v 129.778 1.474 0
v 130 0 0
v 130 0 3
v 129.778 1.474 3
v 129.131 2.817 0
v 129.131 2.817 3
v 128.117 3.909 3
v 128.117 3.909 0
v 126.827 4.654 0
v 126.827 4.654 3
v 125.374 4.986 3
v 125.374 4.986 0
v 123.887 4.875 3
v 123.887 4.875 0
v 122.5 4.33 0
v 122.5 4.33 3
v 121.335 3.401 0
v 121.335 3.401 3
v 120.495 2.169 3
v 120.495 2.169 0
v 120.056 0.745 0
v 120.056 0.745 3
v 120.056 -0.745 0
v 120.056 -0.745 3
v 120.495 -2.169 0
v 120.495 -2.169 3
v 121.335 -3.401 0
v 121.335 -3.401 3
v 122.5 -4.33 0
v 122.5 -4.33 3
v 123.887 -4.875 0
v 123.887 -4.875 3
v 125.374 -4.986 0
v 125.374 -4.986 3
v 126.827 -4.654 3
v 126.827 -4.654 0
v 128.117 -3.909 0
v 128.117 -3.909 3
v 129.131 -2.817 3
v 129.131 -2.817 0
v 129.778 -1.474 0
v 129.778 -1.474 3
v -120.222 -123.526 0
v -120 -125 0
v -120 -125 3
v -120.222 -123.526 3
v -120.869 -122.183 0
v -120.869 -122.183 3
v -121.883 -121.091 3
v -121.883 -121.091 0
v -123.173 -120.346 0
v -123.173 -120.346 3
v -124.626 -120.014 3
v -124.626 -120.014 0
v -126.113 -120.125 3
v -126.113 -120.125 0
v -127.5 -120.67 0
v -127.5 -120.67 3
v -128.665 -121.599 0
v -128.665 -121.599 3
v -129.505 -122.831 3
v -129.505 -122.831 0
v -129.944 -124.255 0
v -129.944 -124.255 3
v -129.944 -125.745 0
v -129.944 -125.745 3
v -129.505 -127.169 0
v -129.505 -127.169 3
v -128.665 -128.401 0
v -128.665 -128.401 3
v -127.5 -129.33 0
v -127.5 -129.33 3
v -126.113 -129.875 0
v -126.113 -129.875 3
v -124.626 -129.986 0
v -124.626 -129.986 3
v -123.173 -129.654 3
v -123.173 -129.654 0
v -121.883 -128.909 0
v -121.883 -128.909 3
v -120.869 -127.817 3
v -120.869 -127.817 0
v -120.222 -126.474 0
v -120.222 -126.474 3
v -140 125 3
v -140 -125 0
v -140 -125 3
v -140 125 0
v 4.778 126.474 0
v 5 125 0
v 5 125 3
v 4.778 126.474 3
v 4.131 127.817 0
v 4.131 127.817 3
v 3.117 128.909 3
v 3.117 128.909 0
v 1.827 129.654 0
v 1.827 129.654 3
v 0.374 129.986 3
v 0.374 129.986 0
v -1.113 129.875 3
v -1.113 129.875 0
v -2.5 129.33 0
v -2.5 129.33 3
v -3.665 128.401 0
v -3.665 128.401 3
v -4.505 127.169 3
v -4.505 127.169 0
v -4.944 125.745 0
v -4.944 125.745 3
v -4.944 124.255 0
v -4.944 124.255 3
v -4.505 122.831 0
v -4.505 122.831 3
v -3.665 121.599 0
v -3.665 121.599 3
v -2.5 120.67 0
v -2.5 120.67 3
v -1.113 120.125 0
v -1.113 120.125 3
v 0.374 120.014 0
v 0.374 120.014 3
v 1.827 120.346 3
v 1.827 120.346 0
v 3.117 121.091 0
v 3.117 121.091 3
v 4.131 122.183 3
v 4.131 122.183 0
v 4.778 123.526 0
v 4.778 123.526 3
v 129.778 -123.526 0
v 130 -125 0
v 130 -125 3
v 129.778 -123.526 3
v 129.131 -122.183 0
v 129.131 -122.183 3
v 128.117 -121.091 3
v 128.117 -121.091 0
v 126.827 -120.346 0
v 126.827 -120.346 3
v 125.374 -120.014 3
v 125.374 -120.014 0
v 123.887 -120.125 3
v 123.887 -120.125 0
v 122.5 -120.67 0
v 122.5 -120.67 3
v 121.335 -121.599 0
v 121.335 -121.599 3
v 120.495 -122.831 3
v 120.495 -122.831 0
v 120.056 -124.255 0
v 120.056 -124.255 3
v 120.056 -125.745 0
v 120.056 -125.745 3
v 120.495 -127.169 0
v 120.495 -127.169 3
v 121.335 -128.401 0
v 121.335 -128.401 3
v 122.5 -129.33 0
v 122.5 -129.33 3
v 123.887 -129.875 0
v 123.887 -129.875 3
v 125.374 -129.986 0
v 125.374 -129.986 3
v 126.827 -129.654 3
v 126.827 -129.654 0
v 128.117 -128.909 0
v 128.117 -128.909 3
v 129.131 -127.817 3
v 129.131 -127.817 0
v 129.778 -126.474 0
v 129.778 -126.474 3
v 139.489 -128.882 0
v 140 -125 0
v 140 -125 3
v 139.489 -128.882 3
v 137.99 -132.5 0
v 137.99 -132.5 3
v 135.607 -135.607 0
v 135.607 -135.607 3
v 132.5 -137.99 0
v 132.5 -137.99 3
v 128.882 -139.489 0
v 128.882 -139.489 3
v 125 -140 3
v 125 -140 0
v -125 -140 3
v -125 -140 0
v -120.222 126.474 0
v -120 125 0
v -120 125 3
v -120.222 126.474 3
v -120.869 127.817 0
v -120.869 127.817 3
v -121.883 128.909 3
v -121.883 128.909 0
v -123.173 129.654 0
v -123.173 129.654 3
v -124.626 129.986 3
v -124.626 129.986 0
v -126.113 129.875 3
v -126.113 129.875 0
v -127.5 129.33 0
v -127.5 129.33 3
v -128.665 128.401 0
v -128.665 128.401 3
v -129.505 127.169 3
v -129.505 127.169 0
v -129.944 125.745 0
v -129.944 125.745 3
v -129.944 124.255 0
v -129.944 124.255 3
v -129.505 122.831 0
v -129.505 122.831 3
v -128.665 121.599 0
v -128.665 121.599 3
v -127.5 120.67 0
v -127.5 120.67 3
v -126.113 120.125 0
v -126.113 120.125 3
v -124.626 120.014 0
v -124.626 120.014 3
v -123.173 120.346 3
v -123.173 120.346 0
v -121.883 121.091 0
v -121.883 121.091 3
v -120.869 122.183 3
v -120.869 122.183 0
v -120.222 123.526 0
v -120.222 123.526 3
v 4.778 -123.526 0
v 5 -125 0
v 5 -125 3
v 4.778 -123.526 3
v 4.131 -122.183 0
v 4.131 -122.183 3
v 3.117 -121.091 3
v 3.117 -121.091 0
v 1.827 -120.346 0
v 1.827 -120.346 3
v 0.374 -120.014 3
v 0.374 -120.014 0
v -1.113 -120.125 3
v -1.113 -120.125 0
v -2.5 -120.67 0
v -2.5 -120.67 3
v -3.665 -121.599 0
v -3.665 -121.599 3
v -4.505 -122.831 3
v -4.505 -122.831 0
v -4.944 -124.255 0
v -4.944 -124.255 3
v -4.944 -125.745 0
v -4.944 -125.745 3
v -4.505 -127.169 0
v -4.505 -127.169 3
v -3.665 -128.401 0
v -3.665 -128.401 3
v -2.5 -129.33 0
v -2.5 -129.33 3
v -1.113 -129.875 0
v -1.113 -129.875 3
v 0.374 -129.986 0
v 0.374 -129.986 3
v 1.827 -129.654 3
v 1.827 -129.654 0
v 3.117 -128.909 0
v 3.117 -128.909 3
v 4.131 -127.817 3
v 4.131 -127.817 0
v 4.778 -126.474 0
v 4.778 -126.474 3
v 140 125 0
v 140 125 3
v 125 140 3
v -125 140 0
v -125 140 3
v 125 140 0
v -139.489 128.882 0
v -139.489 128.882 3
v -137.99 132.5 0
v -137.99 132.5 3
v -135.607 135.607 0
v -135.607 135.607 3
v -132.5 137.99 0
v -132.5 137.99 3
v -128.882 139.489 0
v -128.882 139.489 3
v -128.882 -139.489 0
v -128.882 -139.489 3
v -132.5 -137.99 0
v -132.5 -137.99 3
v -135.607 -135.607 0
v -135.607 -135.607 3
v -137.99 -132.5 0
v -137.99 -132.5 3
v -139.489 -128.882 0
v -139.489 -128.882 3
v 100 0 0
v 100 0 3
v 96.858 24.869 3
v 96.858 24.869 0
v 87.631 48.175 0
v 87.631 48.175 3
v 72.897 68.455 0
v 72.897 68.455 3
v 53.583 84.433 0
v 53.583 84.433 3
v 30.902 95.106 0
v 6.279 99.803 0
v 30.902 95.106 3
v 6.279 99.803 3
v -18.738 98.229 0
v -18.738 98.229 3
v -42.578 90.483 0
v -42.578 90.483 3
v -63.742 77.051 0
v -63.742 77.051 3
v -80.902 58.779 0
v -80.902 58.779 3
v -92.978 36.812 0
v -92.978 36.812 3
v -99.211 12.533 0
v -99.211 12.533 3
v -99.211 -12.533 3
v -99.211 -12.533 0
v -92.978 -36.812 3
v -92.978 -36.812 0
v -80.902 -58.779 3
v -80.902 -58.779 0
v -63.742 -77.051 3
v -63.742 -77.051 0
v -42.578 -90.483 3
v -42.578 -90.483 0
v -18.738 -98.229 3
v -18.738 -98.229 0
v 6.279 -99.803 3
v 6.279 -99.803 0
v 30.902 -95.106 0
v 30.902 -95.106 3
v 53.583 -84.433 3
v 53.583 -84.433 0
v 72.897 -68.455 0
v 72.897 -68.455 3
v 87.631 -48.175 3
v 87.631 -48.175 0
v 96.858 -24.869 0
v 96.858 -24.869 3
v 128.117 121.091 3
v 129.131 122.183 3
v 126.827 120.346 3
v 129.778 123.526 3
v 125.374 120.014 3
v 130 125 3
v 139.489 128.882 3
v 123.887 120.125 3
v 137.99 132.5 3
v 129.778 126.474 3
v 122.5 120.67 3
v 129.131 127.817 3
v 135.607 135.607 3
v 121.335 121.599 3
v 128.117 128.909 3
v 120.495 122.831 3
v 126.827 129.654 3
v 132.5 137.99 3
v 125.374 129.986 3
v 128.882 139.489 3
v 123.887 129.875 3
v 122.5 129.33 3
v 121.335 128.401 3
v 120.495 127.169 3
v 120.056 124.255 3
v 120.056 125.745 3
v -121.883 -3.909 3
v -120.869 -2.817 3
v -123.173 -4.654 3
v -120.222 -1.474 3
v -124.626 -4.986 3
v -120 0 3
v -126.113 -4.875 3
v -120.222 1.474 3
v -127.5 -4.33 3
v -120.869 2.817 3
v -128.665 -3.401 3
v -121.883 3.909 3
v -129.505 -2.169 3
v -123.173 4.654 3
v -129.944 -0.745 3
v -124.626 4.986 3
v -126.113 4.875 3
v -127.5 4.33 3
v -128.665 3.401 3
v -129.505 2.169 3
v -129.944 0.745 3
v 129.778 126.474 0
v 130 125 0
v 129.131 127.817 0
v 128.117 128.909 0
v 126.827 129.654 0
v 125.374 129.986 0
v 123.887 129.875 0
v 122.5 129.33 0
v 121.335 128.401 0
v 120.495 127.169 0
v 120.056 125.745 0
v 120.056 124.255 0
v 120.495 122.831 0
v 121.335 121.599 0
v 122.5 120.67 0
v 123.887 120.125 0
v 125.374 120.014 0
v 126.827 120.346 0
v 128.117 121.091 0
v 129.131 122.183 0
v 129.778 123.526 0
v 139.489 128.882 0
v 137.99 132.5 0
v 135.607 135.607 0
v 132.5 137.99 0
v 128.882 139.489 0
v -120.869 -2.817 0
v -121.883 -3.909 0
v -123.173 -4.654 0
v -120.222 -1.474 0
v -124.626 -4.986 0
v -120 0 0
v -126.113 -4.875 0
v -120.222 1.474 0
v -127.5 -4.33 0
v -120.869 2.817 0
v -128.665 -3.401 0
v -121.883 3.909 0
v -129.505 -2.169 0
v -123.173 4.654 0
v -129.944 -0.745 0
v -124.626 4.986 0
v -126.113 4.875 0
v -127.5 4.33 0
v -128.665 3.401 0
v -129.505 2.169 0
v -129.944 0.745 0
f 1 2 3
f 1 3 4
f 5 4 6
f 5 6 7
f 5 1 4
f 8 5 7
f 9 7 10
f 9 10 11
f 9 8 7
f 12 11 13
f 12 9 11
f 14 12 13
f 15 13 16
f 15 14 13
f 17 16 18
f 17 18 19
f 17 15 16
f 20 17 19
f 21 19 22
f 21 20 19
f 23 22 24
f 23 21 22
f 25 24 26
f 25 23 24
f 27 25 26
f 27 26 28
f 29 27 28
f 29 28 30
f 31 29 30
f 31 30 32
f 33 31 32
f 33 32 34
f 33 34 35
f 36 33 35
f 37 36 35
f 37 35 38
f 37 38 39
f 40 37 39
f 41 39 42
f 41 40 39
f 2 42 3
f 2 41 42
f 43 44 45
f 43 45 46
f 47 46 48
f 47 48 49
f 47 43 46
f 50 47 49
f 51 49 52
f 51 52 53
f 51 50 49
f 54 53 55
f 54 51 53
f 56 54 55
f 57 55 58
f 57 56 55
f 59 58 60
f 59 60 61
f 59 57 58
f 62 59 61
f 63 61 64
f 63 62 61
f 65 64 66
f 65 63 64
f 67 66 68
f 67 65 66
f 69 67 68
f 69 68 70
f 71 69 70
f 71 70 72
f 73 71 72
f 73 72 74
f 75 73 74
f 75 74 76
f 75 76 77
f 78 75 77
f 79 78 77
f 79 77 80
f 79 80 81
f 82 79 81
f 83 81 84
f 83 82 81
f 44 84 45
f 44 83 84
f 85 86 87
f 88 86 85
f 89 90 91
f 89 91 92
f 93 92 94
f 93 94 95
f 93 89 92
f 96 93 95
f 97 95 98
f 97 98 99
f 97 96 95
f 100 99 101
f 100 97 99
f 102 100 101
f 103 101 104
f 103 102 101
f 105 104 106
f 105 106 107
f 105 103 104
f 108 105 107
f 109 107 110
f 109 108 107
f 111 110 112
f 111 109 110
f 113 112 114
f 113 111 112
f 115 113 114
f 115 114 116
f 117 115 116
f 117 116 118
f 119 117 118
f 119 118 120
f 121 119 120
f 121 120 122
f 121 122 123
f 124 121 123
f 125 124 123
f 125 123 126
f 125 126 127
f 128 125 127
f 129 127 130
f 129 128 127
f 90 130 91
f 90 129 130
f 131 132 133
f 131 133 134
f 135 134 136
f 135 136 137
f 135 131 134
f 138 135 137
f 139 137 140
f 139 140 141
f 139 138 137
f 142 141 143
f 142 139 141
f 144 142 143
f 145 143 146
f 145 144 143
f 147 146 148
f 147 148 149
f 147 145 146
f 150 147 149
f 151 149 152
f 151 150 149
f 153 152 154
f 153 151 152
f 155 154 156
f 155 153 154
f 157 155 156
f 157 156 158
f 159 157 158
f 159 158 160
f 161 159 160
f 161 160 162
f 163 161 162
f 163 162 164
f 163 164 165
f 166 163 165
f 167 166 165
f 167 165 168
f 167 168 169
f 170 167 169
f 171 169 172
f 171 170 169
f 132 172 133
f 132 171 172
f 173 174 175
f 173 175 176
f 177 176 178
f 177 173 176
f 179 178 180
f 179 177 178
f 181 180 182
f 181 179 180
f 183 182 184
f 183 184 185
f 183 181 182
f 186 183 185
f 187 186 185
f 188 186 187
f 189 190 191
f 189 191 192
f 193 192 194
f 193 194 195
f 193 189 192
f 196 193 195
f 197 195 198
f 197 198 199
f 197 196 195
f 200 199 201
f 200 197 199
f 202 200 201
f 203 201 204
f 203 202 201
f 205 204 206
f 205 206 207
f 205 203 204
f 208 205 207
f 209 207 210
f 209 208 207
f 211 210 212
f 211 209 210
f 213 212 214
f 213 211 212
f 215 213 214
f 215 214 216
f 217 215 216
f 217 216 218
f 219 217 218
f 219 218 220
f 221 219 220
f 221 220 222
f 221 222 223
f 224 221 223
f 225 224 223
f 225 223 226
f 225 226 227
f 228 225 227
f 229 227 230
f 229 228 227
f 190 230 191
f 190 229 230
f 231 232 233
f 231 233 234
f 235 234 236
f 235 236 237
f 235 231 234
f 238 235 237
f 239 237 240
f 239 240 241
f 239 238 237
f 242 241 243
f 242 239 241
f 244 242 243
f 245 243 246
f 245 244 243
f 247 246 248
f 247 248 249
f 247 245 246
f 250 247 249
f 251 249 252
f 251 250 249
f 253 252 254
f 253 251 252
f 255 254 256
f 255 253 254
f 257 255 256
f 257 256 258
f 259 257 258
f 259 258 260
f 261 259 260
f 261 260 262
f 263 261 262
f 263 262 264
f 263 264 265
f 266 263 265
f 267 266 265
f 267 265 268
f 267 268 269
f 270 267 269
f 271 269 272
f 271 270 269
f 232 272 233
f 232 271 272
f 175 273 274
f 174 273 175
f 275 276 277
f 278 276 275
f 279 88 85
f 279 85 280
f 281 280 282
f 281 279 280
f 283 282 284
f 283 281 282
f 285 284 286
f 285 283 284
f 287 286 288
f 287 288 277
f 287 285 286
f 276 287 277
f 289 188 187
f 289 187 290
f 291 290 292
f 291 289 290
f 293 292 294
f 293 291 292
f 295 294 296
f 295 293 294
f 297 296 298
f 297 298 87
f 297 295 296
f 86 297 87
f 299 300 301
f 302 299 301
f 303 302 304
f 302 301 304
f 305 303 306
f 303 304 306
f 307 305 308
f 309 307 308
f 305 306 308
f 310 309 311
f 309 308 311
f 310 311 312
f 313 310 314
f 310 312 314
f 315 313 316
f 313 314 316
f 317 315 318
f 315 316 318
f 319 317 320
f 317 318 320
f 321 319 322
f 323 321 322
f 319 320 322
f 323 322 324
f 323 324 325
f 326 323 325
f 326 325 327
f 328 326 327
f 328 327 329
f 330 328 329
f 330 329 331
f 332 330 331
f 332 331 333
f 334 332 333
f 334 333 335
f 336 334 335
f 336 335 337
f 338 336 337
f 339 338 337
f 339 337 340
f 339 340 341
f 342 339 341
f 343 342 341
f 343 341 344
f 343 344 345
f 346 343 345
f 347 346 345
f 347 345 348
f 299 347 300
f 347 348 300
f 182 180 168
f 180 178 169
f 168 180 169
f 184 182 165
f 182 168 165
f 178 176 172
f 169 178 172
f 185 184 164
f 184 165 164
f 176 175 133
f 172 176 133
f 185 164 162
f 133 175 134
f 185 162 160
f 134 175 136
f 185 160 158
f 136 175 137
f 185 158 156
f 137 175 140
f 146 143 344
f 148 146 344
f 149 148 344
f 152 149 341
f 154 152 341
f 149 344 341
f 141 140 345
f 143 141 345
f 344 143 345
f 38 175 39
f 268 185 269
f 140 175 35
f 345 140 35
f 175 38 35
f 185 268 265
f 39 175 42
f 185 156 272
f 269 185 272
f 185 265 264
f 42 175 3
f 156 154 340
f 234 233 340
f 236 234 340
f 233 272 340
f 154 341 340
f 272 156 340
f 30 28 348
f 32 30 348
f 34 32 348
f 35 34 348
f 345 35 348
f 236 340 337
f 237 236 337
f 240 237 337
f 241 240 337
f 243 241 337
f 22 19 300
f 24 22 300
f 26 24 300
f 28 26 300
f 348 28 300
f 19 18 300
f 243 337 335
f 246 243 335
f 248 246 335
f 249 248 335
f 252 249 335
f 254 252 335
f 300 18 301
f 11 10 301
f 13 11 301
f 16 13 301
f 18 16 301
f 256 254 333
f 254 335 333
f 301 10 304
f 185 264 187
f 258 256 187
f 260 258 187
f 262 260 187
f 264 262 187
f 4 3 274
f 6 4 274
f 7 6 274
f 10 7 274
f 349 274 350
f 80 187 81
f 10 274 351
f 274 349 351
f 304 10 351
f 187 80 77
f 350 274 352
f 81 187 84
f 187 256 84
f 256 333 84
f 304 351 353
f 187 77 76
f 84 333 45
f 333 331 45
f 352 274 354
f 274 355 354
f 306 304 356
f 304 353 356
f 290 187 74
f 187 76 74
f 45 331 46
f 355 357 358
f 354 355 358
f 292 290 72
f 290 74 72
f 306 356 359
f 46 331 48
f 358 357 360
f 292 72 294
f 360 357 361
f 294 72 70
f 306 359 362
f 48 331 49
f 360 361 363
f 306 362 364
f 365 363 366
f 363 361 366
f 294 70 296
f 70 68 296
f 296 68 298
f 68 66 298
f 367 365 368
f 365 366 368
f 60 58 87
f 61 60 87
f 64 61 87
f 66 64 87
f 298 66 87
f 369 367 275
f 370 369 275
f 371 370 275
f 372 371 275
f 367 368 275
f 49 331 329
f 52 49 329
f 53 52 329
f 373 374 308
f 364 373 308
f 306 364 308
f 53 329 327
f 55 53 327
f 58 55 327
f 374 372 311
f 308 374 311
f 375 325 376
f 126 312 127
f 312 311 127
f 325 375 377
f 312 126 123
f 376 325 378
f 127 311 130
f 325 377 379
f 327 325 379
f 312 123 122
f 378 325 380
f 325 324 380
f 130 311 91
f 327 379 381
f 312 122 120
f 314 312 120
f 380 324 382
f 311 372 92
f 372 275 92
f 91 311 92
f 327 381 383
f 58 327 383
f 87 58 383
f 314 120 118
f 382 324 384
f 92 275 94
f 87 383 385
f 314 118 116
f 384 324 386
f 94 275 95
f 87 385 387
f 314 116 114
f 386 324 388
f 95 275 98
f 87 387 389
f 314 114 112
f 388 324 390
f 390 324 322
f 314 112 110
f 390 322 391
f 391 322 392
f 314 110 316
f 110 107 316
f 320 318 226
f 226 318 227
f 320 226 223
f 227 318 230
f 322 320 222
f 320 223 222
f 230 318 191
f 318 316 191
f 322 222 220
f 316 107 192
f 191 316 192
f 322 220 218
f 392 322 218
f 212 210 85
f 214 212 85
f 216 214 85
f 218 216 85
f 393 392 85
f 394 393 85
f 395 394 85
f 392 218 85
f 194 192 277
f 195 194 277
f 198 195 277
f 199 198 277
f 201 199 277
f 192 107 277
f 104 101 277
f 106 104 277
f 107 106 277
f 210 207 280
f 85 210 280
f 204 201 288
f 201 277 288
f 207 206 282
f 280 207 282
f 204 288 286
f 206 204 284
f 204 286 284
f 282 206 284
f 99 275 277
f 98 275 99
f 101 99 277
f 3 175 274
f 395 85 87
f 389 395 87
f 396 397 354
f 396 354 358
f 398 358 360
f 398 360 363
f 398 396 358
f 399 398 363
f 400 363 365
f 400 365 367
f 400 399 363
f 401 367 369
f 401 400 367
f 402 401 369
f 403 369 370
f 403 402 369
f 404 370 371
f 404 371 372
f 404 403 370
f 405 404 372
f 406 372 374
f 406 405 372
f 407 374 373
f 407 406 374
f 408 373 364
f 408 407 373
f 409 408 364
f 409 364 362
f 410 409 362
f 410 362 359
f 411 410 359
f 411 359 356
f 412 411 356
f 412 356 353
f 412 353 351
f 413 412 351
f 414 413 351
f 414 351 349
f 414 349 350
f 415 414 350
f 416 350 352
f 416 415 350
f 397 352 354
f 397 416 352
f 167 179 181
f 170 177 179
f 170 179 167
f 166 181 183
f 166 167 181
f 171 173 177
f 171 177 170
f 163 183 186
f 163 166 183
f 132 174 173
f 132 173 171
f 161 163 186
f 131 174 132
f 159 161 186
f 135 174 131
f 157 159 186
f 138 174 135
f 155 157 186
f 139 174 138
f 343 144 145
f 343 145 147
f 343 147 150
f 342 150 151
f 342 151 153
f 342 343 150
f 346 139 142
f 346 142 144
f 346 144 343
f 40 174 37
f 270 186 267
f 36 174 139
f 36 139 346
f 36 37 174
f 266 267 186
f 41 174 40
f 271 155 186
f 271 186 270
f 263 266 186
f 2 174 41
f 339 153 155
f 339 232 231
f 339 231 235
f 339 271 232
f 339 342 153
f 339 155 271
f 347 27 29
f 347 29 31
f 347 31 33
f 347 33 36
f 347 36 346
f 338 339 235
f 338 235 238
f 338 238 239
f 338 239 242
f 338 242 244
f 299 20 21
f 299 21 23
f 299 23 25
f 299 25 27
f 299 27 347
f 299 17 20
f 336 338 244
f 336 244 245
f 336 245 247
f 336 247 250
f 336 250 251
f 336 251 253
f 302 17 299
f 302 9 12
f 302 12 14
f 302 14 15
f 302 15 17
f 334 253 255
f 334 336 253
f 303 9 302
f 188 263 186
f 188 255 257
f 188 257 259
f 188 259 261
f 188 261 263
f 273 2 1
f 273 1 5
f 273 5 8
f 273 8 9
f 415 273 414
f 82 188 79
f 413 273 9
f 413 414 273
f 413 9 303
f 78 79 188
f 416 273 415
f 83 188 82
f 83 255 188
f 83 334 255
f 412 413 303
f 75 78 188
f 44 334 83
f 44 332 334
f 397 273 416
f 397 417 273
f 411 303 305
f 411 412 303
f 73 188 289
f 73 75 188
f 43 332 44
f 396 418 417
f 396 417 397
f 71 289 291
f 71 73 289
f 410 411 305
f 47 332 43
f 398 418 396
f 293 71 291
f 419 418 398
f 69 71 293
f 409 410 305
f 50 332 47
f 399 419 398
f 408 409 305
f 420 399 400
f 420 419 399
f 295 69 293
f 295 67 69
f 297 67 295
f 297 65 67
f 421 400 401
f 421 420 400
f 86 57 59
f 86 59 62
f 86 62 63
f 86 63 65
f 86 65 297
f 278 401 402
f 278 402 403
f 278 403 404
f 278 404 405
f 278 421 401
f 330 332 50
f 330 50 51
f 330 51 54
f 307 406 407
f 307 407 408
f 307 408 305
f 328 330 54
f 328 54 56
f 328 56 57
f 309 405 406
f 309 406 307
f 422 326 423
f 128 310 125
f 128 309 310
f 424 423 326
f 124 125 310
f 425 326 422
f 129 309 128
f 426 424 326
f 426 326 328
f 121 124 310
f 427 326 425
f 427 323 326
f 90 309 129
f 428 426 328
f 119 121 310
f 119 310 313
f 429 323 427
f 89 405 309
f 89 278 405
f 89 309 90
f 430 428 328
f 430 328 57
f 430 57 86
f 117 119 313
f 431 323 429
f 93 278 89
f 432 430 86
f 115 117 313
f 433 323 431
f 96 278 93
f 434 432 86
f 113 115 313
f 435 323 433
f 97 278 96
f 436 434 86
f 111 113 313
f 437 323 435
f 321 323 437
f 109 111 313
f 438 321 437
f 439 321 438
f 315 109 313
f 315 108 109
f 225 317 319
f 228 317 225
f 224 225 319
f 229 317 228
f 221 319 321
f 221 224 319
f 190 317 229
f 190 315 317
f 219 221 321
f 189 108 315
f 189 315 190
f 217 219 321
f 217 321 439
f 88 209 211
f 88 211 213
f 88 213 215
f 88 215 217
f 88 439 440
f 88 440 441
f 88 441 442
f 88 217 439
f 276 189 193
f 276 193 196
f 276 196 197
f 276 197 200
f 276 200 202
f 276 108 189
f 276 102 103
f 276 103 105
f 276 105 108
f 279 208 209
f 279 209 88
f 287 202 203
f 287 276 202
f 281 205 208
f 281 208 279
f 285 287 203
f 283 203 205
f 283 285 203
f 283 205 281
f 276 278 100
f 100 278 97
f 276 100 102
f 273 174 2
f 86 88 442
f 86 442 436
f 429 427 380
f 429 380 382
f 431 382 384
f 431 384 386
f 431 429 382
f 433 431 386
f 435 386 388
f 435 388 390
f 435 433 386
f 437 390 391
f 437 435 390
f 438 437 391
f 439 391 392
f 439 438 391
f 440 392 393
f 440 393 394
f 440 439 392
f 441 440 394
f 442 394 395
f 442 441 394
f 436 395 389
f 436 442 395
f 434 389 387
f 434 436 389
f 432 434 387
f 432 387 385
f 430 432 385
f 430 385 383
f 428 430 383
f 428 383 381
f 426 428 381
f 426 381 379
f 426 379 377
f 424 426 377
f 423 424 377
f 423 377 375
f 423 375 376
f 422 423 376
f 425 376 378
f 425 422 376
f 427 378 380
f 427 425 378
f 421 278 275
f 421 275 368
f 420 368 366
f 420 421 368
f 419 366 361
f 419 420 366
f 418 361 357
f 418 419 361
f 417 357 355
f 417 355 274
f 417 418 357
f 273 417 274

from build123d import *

# Parameters (mm, degrees)
SKETCH2_R           = 5
SKETCH2_R_2         = 4
BOSS_EXTRUDE1_DEPTH = 3
SKETCH7_R           = 100
CUT_EXTRUDE2_DEPTH  = 10


with BuildPart() as part:
    # Sketch2 → Boss-Extrude1 (new body)
    with BuildSketch(Plane.XY):
        with BuildLine():
            Line((-125, 140), (125, 140))
            ThreePointArc((125, 140), (135.606601718, 135.606601718), (140, 125))
            Line((140, 125), (140, -125))
            ThreePointArc((140, -125), (135.606601718, -135.606601718), (125, -140))
            Line((125, -140), (-125, -140))
            ThreePointArc((-125, -140), (-135.606601718, -135.606601718), (-140, -125))
            Line((-140, -125), (-140, 125))
            ThreePointArc((-140, 125), (-135.606601718, 135.606601718), (-125, 140))
        make_face()
        with Locations((-125, 125)):
            Circle(SKETCH2_R, mode=Mode.SUBTRACT)
        with Locations((0, 125)):
            Circle(SKETCH2_R, mode=Mode.SUBTRACT)
        with Locations((125, 125)):
            Circle(SKETCH2_R, mode=Mode.SUBTRACT)
        Circle(SKETCH2_R_2, mode=Mode.SUBTRACT)
        with Locations((125, 0)):
            Circle(SKETCH2_R, mode=Mode.SUBTRACT)
        with Locations((-125, 0)):
            Circle(SKETCH2_R, mode=Mode.SUBTRACT)
        with Locations((-125, -125)):
            Circle(SKETCH2_R, mode=Mode.SUBTRACT)
        with Locations((0, -125)):
            Circle(SKETCH2_R, mode=Mode.SUBTRACT)
        with Locations((125, -125)):
            Circle(SKETCH2_R, mode=Mode.SUBTRACT)
    extrude(amount=BOSS_EXTRUDE1_DEPTH)

    # Sketch7 → Cut-Extrude2 (cut)
    with BuildSketch(Plane.XY.offset(3)):
        Circle(SKETCH7_R)
    extrude(amount=-CUT_EXTRUDE2_DEPTH, mode=Mode.SUBTRACT)


solid = part.part
